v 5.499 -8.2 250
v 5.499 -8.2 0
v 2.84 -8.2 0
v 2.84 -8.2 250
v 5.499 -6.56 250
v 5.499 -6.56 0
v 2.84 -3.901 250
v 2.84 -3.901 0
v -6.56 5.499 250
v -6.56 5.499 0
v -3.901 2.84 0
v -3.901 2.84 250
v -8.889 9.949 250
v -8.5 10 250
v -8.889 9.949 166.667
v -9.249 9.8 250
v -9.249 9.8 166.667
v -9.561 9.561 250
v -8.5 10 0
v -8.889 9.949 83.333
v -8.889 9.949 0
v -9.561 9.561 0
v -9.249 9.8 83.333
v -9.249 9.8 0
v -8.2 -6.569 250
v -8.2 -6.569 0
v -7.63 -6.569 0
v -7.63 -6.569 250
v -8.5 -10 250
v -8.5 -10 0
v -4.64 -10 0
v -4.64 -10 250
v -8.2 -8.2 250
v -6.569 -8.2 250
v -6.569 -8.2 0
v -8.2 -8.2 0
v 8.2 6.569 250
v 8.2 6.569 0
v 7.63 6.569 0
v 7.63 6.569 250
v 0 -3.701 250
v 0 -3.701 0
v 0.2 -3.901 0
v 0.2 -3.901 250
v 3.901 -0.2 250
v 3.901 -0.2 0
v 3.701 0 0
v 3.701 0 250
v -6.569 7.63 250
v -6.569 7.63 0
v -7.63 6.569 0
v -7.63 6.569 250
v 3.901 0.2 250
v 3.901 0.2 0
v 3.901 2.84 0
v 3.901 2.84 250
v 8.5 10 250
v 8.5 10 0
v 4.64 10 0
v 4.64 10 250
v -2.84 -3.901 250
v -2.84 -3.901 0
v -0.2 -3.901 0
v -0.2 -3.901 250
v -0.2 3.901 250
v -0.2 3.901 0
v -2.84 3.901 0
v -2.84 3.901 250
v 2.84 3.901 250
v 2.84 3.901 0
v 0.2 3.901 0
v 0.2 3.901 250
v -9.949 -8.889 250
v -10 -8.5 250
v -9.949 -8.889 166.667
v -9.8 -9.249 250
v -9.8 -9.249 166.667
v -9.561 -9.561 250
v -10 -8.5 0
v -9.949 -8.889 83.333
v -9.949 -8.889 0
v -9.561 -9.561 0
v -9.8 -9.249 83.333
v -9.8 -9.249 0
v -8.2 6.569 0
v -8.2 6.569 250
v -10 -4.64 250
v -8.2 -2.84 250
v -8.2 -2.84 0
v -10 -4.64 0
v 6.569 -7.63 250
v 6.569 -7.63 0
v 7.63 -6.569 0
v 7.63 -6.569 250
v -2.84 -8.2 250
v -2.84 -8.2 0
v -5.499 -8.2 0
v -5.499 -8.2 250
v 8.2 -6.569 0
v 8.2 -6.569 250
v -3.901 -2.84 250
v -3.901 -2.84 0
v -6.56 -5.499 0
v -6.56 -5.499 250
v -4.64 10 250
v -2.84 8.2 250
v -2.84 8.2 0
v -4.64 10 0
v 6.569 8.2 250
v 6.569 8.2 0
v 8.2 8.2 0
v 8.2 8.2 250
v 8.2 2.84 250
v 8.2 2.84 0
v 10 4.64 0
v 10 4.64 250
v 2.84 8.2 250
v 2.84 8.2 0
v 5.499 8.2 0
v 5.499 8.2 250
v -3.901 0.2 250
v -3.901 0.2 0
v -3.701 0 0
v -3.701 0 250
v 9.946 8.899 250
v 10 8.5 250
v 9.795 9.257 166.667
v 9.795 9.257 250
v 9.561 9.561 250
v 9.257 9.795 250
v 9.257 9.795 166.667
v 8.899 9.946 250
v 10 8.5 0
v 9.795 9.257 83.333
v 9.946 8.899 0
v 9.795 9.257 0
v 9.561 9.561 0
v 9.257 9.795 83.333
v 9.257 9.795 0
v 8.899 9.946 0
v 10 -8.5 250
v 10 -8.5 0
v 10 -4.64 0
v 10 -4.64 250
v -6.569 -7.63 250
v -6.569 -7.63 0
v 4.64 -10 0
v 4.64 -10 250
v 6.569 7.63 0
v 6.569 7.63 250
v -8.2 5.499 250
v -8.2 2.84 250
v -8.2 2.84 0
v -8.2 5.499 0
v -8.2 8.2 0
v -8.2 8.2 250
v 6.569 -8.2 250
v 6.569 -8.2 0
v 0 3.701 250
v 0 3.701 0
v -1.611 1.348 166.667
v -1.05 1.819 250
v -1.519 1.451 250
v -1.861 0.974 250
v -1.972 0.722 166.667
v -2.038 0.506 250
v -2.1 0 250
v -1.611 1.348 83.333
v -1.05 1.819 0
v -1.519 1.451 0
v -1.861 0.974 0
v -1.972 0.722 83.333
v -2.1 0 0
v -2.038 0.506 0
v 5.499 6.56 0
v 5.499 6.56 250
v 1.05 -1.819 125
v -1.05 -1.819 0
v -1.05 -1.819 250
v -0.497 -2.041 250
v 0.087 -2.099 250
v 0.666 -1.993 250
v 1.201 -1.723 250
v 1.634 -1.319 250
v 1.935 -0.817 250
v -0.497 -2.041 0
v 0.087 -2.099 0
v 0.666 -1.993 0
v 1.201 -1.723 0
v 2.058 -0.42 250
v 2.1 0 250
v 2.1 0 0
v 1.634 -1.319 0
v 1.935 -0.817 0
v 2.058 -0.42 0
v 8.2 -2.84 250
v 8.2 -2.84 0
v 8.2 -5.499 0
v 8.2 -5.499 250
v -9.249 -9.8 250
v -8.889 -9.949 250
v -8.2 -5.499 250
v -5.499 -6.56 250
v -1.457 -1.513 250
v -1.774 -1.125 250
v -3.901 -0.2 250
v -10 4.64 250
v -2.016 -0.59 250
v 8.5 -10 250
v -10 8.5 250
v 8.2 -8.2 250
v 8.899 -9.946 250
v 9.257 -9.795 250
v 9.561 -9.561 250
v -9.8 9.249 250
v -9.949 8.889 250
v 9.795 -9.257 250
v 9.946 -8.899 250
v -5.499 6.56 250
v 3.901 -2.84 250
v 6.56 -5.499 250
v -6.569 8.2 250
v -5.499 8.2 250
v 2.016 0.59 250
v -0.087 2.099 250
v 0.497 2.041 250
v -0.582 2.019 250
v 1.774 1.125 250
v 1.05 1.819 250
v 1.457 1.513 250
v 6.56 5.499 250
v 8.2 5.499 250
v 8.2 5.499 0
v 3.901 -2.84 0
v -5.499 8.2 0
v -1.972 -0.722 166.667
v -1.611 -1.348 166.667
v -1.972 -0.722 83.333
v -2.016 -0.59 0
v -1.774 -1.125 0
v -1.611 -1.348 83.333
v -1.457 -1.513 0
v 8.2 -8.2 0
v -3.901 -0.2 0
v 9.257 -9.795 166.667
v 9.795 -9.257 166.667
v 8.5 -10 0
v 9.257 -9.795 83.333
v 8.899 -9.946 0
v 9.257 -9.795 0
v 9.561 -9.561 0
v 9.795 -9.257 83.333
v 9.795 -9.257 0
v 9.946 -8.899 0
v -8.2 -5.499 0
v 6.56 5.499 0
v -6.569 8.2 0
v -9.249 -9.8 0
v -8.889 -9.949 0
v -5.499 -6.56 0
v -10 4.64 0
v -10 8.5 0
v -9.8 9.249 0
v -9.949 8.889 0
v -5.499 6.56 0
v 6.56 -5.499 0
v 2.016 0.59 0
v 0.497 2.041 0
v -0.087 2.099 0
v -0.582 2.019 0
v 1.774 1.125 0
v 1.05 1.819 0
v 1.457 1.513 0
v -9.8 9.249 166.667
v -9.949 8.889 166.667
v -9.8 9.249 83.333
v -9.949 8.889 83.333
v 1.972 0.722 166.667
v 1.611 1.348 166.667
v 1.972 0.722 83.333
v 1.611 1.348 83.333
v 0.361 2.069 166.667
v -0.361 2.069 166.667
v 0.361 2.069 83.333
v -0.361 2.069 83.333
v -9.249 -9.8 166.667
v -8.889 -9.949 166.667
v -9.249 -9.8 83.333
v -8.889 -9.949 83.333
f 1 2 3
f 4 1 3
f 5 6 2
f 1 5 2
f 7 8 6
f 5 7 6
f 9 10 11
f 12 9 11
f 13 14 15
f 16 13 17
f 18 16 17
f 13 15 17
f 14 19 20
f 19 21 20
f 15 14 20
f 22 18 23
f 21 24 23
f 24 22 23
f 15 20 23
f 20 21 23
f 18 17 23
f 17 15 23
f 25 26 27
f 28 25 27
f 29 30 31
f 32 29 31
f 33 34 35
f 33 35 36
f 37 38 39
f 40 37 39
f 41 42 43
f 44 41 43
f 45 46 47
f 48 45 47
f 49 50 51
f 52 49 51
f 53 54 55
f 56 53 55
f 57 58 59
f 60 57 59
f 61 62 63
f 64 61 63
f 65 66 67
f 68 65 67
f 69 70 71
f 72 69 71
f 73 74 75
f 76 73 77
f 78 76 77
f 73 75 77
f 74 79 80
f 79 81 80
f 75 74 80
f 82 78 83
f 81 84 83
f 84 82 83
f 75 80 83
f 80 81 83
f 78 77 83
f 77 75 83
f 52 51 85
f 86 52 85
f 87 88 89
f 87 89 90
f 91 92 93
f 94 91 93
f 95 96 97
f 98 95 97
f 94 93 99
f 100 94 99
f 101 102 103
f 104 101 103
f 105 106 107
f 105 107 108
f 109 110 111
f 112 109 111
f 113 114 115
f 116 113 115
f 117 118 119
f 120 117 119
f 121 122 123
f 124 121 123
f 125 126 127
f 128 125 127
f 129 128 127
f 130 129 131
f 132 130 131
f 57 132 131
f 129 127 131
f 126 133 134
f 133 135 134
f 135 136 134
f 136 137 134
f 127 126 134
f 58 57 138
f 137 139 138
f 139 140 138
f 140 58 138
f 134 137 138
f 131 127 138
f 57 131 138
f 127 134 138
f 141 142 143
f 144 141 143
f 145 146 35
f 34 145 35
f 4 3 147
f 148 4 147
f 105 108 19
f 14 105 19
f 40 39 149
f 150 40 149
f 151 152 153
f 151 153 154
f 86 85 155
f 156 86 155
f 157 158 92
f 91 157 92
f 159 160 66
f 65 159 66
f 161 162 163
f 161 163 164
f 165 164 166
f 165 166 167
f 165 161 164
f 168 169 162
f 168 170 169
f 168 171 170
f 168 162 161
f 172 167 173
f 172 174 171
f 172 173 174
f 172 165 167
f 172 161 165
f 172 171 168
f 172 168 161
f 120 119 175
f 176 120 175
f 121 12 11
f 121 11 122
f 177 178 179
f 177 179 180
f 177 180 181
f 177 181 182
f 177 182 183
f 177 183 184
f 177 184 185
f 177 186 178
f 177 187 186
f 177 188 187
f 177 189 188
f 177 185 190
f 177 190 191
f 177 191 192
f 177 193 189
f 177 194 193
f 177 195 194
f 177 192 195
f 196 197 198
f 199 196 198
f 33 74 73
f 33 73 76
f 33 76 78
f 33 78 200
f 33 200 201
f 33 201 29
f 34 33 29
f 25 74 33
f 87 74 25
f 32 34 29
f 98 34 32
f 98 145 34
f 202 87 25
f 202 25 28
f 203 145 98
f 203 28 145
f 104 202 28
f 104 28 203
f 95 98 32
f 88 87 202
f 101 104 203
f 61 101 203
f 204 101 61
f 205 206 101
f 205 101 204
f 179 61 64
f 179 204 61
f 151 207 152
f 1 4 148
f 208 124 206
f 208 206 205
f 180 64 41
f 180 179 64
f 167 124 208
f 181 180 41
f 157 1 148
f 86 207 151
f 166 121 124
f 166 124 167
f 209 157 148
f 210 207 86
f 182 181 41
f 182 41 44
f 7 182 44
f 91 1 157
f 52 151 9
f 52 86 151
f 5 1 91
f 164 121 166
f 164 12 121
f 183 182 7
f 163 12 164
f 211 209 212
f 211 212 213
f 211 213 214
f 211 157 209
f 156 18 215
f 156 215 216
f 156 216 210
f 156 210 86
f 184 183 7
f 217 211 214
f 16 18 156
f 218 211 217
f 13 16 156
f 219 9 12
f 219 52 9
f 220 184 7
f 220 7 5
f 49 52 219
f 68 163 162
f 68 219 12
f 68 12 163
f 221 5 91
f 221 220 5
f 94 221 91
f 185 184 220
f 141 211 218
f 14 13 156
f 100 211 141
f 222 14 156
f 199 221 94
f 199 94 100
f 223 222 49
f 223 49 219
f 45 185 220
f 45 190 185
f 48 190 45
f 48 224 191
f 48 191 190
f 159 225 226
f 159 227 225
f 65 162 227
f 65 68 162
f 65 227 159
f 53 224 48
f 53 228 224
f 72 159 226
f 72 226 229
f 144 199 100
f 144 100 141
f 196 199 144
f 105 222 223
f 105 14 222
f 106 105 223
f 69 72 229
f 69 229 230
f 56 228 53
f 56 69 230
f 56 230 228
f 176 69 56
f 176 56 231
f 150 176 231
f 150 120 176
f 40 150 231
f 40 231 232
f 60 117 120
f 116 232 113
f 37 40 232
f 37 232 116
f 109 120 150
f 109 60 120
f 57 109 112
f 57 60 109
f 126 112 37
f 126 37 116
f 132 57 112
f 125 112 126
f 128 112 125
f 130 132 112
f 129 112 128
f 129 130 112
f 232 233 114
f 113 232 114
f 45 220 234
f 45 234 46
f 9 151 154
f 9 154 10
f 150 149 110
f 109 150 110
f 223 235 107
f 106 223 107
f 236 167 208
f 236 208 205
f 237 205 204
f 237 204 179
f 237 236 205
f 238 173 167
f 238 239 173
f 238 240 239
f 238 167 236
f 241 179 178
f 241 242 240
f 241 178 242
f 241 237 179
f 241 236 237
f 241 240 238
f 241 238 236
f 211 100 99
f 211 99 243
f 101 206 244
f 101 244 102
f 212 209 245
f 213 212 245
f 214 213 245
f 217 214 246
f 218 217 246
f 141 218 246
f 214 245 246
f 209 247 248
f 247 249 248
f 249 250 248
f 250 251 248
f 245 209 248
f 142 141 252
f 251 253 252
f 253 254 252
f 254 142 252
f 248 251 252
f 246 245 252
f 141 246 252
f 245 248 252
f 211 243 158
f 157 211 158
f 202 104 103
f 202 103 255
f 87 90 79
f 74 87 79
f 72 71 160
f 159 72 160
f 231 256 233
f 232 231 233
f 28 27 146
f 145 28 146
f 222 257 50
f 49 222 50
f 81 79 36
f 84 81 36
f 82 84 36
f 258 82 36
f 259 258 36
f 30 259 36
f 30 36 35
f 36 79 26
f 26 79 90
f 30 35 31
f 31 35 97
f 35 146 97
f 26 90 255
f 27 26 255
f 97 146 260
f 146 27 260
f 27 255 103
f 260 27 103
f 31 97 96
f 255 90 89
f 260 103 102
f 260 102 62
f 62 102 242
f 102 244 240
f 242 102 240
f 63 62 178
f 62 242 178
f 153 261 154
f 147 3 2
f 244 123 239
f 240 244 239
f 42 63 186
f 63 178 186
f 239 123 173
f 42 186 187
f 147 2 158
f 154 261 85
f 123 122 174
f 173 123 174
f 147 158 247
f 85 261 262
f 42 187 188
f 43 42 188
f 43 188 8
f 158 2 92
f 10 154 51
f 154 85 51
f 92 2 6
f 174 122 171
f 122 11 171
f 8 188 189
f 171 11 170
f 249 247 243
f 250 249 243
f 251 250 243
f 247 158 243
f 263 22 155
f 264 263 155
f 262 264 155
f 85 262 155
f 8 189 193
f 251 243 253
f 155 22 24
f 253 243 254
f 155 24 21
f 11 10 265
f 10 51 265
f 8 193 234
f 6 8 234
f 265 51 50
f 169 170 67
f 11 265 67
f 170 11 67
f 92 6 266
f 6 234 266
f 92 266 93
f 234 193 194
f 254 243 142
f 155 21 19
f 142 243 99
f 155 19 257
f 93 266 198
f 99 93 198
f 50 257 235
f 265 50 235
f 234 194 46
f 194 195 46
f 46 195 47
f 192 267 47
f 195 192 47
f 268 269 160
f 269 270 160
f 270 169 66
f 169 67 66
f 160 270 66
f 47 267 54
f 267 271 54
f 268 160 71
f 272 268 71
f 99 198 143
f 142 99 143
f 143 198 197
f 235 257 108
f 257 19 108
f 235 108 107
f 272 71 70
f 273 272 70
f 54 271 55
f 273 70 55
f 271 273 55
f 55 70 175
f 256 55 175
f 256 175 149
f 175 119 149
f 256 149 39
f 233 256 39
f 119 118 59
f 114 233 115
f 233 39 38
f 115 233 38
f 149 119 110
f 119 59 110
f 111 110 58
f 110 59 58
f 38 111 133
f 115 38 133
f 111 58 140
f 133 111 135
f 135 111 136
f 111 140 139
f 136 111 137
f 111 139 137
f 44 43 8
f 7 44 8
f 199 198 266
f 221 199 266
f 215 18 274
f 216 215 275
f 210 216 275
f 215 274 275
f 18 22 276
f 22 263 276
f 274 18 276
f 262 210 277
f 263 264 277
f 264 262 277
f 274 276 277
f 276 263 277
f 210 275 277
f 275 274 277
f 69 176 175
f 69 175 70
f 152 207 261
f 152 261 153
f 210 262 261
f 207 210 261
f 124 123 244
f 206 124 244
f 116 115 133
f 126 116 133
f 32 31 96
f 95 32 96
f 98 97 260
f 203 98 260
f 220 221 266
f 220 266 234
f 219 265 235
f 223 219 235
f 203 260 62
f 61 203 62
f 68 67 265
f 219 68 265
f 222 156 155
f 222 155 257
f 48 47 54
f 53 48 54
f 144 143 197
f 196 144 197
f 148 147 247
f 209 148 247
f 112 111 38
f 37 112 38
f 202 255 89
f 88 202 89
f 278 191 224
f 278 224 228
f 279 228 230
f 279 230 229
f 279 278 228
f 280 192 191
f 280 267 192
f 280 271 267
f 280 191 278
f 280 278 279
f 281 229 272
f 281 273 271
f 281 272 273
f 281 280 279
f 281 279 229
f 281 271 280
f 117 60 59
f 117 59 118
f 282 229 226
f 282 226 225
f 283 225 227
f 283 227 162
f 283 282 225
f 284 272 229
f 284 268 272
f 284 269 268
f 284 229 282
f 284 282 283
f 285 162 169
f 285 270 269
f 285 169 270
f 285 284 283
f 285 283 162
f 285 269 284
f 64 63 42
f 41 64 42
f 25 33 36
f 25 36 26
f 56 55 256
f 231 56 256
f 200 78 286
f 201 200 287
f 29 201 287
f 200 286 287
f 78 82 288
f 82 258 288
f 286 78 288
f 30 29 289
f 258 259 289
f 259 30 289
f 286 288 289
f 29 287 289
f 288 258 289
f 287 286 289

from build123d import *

# Parameters (mm, degrees)
F1_DEPTH = 250


with BuildPart() as f1:
    # F0 (on Top) → F1 (new body)
    with BuildSketch(Plane.XY):
        with BuildLine():
            Line((-4.64, 10.000001), (-8.500001, 10.000001))
            add(Edge.make_bspline(
                [(-8.500001, 10.000001), (-8.897826, 10.000001), (-9.279357, 9.841966), (-9.560661, 9.560661)],
                knots=[0, 0, 0, 0, 1, 1, 1, 1], degree=3))
            add(Edge.make_bspline(
                [(-9.560661, 9.560661), (-9.841966, 9.279357), (-10.000001, 8.897826), (-10.000001, 8.500001)],
                knots=[0, 0, 0, 0, 1, 1, 1, 1], degree=3))
            Line((-10.000001, 8.500001), (-10.000001, 4.640001))
            Line((-10.000001, 4.640001), (-8.199999, 2.84))
            Line((-8.199999, 2.84), (-8.199999, 5.499339))
            Line((-8.199999, 5.499339), (-6.56, 5.499339))
            Line((-6.56, 5.499339), (-3.90066, 2.84))
            Line((-3.90066, 2.84), (-3.90066, 0.2))
            Line((-3.90066, 0.2), (-3.70066, -1e-06))
            Line((-3.70066, -1e-06), (-3.90066, -0.200001))
            Line((-3.90066, -0.200001), (-3.90066, -2.840001))
            Line((-3.90066, -2.840001), (-6.56, -5.499341))
            Line((-6.56, -5.499341), (-8.199999, -5.499341))
            Line((-8.199999, -5.499341), (-8.199999, -2.840001))
            Line((-8.199999, -2.840001), (-10.000001, -4.640002))
            Line((-10.000001, -4.640002), (-10.000001, -8.500002))
            add(Edge.make_bspline(
                [(-10.000001, -8.500002), (-10.000001, -8.897827), (-9.841966, -9.279358), (-9.560661, -9.560662)],
                knots=[0, 0, 0, 0, 1, 1, 1, 1], degree=3))
            add(Edge.make_bspline(
                [(-9.560661, -9.560662), (-9.279356, -9.841967), (-8.897826, -10.000002), (-8.500001, -10.000002)],
                knots=[0, 0, 0, 0, 1, 1, 1, 1], degree=3))
            Line((-8.500001, -10.000002), (-4.64, -10.000002))
            Line((-4.64, -10.000002), (-2.84, -8.200001))
            Line((-2.84, -8.200001), (-5.49934, -8.200001))
            Line((-5.49934, -8.200001), (-5.49934, -6.560001))
            Line((-5.49934, -6.560001), (-2.84, -3.900661))
            Line((-2.84, -3.900661), (-0.199999, -3.900661))
            Line((-0.199999, -3.900661), (1e-06, -3.700661))
            Line((1e-06, -3.700661), (0.200001, -3.900661))
            Line((0.200001, -3.900661), (2.84, -3.900661))
            Line((2.84, -3.900661), (5.499342, -6.560001))
            Line((5.499342, -6.560001), (5.499342, -8.200001))
            Line((5.499342, -8.200001), (2.84, -8.200001))
            Line((2.84, -8.200001), (4.64, -10.000002))
            Line((4.64, -10.000002), (8.500001, -10.000002))
            add(Edge.make_bspline(
                [(8.500001, -10.000002), (9.328428, -10.000002), (10.000001, -9.328429), (10.000001, -8.500002)],
                knots=[0, 0, 0, 0, 1, 1, 1, 1], degree=3))
            Line((10.000001, -8.500002), (10.000001, -4.640002))
            Line((10.000001, -4.640002), (8.200001, -2.840001))
            Line((8.200001, -2.840001), (8.200001, -5.499341))
            Line((8.200001, -5.499341), (6.560001, -5.499341))
            Line((6.560001, -5.499341), (3.90066, -2.840001))
            Line((3.90066, -2.840001), (3.90066, -0.200001))
            Line((3.90066, -0.200001), (3.70066, -1e-06))
            Line((3.70066, -1e-06), (3.90066, 0.2))
            Line((3.90066, 0.2), (3.90066, 2.84))
            Line((3.90066, 2.84), (6.560001, 5.499339))
            Line((6.560001, 5.499339), (8.200001, 5.499339))
            Line((8.200001, 5.499339), (8.200001, 2.84))
            Line((8.200001, 2.84), (10.000001, 4.640001))
            Line((10.000001, 4.640001), (10.000001, 8.500001))
            add(Edge.make_bspline(
                [(10.000001, 8.500001), (10.000001, 9.328428), (9.328428, 10.000001), (8.500001, 10.000001)],
                knots=[0, 0, 0, 0, 1, 1, 1, 1], degree=3))
            Line((8.500001, 10.000001), (4.64, 10.000001))
            Line((4.64, 10.000001), (2.84, 8.200001))
            Line((2.84, 8.200001), (5.499342, 8.200001))
            Line((5.499342, 8.200001), (5.499342, 6.559999))
            Line((5.499342, 6.559999), (2.84, 3.90066))
            Line((2.84, 3.90066), (0.200001, 3.90066))
            Line((0.200001, 3.90066), (1e-06, 3.70066))
            Line((1e-06, 3.70066), (-0.199999, 3.90066))
            Line((-0.199999, 3.90066), (-2.84, 3.90066))
            Line((-2.84, 3.90066), (-5.49934, 6.559999))
            Line((-5.49934, 6.559999), (-5.49934, 8.200001))
            Line((-5.49934, 8.200001), (-2.84, 8.200001))
            Line((-2.84, 8.200001), (-4.64, 10.000001))
        make_face()
        Polygon((-6.56934, -8.200001), (-8.199999, -8.200001), (-8.199999, -6.569341), (-7.629999, -6.569341), (-6.56934, -7.630001), align=None, mode=Mode.SUBTRACT)
        Polygon((8.200001, -8.200001), (6.56934, -8.200001), (6.56934, -7.630001), (7.630003, -6.569341), (8.200001, -6.569341), align=None, mode=Mode.SUBTRACT)
        Polygon((-8.199999, 8.200001), (-6.56934, 8.200001), (-6.56934, 7.63), (-7.629999, 6.56934), (-8.199999, 6.56934), align=None, mode=Mode.SUBTRACT)
        with BuildLine():
            add(Edge.make_bspline(
                [(2.100001, -1e-06), (2.100276, 0.750441), (1.700078, 1.443994), (1.050223, 1.819295)],
                knots=[0, 0, 0, 0, 1, 1, 1, 1], degree=3))
            add(Edge.make_bspline(
                [(1.050223, -1.819296), (1.700078, -1.443996), (2.100276, -0.750442), (2.100001, -1e-06)],
                knots=[0, 0, 0, 0, 1, 1, 1, 1], degree=3))
            add(Edge.make_bspline(
                [(-1.050222, -1.819296), (-0.400366, -2.194596), (0.400368, -2.194596), (1.050223, -1.819296)],
                knots=[0, 0, 0, 0, 1, 1, 1, 1], degree=3))
            add(Edge.make_bspline(
                [(-2.099999, -1e-06), (-2.100275, -0.750442), (-1.700077, -1.443996), (-1.050222, -1.819296)],
                knots=[0, 0, 0, 0, 1, 1, 1, 1], degree=3))
            add(Edge.make_bspline(
                [(-1.050222, 1.819295), (-1.700077, 1.443994), (-2.100275, 0.750441), (-2.099999, -1e-06)],
                knots=[0, 0, 0, 0, 1, 1, 1, 1], degree=3))
            add(Edge.make_bspline(
                [(1.050223, 1.819295), (0.400368, 2.194595), (-0.400366, 2.194595), (-1.050222, 1.819295)],
                knots=[0, 0, 0, 0, 1, 1, 1, 1], degree=3))
        make_face(mode=Mode.SUBTRACT)
        Polygon((6.56934, 8.200001), (8.200001, 8.200001), (8.200001, 6.56934), (7.630003, 6.56934), (6.56934, 7.63), align=None, mode=Mode.SUBTRACT)
    extrude(amount=F1_DEPTH)


solid = f1.part
